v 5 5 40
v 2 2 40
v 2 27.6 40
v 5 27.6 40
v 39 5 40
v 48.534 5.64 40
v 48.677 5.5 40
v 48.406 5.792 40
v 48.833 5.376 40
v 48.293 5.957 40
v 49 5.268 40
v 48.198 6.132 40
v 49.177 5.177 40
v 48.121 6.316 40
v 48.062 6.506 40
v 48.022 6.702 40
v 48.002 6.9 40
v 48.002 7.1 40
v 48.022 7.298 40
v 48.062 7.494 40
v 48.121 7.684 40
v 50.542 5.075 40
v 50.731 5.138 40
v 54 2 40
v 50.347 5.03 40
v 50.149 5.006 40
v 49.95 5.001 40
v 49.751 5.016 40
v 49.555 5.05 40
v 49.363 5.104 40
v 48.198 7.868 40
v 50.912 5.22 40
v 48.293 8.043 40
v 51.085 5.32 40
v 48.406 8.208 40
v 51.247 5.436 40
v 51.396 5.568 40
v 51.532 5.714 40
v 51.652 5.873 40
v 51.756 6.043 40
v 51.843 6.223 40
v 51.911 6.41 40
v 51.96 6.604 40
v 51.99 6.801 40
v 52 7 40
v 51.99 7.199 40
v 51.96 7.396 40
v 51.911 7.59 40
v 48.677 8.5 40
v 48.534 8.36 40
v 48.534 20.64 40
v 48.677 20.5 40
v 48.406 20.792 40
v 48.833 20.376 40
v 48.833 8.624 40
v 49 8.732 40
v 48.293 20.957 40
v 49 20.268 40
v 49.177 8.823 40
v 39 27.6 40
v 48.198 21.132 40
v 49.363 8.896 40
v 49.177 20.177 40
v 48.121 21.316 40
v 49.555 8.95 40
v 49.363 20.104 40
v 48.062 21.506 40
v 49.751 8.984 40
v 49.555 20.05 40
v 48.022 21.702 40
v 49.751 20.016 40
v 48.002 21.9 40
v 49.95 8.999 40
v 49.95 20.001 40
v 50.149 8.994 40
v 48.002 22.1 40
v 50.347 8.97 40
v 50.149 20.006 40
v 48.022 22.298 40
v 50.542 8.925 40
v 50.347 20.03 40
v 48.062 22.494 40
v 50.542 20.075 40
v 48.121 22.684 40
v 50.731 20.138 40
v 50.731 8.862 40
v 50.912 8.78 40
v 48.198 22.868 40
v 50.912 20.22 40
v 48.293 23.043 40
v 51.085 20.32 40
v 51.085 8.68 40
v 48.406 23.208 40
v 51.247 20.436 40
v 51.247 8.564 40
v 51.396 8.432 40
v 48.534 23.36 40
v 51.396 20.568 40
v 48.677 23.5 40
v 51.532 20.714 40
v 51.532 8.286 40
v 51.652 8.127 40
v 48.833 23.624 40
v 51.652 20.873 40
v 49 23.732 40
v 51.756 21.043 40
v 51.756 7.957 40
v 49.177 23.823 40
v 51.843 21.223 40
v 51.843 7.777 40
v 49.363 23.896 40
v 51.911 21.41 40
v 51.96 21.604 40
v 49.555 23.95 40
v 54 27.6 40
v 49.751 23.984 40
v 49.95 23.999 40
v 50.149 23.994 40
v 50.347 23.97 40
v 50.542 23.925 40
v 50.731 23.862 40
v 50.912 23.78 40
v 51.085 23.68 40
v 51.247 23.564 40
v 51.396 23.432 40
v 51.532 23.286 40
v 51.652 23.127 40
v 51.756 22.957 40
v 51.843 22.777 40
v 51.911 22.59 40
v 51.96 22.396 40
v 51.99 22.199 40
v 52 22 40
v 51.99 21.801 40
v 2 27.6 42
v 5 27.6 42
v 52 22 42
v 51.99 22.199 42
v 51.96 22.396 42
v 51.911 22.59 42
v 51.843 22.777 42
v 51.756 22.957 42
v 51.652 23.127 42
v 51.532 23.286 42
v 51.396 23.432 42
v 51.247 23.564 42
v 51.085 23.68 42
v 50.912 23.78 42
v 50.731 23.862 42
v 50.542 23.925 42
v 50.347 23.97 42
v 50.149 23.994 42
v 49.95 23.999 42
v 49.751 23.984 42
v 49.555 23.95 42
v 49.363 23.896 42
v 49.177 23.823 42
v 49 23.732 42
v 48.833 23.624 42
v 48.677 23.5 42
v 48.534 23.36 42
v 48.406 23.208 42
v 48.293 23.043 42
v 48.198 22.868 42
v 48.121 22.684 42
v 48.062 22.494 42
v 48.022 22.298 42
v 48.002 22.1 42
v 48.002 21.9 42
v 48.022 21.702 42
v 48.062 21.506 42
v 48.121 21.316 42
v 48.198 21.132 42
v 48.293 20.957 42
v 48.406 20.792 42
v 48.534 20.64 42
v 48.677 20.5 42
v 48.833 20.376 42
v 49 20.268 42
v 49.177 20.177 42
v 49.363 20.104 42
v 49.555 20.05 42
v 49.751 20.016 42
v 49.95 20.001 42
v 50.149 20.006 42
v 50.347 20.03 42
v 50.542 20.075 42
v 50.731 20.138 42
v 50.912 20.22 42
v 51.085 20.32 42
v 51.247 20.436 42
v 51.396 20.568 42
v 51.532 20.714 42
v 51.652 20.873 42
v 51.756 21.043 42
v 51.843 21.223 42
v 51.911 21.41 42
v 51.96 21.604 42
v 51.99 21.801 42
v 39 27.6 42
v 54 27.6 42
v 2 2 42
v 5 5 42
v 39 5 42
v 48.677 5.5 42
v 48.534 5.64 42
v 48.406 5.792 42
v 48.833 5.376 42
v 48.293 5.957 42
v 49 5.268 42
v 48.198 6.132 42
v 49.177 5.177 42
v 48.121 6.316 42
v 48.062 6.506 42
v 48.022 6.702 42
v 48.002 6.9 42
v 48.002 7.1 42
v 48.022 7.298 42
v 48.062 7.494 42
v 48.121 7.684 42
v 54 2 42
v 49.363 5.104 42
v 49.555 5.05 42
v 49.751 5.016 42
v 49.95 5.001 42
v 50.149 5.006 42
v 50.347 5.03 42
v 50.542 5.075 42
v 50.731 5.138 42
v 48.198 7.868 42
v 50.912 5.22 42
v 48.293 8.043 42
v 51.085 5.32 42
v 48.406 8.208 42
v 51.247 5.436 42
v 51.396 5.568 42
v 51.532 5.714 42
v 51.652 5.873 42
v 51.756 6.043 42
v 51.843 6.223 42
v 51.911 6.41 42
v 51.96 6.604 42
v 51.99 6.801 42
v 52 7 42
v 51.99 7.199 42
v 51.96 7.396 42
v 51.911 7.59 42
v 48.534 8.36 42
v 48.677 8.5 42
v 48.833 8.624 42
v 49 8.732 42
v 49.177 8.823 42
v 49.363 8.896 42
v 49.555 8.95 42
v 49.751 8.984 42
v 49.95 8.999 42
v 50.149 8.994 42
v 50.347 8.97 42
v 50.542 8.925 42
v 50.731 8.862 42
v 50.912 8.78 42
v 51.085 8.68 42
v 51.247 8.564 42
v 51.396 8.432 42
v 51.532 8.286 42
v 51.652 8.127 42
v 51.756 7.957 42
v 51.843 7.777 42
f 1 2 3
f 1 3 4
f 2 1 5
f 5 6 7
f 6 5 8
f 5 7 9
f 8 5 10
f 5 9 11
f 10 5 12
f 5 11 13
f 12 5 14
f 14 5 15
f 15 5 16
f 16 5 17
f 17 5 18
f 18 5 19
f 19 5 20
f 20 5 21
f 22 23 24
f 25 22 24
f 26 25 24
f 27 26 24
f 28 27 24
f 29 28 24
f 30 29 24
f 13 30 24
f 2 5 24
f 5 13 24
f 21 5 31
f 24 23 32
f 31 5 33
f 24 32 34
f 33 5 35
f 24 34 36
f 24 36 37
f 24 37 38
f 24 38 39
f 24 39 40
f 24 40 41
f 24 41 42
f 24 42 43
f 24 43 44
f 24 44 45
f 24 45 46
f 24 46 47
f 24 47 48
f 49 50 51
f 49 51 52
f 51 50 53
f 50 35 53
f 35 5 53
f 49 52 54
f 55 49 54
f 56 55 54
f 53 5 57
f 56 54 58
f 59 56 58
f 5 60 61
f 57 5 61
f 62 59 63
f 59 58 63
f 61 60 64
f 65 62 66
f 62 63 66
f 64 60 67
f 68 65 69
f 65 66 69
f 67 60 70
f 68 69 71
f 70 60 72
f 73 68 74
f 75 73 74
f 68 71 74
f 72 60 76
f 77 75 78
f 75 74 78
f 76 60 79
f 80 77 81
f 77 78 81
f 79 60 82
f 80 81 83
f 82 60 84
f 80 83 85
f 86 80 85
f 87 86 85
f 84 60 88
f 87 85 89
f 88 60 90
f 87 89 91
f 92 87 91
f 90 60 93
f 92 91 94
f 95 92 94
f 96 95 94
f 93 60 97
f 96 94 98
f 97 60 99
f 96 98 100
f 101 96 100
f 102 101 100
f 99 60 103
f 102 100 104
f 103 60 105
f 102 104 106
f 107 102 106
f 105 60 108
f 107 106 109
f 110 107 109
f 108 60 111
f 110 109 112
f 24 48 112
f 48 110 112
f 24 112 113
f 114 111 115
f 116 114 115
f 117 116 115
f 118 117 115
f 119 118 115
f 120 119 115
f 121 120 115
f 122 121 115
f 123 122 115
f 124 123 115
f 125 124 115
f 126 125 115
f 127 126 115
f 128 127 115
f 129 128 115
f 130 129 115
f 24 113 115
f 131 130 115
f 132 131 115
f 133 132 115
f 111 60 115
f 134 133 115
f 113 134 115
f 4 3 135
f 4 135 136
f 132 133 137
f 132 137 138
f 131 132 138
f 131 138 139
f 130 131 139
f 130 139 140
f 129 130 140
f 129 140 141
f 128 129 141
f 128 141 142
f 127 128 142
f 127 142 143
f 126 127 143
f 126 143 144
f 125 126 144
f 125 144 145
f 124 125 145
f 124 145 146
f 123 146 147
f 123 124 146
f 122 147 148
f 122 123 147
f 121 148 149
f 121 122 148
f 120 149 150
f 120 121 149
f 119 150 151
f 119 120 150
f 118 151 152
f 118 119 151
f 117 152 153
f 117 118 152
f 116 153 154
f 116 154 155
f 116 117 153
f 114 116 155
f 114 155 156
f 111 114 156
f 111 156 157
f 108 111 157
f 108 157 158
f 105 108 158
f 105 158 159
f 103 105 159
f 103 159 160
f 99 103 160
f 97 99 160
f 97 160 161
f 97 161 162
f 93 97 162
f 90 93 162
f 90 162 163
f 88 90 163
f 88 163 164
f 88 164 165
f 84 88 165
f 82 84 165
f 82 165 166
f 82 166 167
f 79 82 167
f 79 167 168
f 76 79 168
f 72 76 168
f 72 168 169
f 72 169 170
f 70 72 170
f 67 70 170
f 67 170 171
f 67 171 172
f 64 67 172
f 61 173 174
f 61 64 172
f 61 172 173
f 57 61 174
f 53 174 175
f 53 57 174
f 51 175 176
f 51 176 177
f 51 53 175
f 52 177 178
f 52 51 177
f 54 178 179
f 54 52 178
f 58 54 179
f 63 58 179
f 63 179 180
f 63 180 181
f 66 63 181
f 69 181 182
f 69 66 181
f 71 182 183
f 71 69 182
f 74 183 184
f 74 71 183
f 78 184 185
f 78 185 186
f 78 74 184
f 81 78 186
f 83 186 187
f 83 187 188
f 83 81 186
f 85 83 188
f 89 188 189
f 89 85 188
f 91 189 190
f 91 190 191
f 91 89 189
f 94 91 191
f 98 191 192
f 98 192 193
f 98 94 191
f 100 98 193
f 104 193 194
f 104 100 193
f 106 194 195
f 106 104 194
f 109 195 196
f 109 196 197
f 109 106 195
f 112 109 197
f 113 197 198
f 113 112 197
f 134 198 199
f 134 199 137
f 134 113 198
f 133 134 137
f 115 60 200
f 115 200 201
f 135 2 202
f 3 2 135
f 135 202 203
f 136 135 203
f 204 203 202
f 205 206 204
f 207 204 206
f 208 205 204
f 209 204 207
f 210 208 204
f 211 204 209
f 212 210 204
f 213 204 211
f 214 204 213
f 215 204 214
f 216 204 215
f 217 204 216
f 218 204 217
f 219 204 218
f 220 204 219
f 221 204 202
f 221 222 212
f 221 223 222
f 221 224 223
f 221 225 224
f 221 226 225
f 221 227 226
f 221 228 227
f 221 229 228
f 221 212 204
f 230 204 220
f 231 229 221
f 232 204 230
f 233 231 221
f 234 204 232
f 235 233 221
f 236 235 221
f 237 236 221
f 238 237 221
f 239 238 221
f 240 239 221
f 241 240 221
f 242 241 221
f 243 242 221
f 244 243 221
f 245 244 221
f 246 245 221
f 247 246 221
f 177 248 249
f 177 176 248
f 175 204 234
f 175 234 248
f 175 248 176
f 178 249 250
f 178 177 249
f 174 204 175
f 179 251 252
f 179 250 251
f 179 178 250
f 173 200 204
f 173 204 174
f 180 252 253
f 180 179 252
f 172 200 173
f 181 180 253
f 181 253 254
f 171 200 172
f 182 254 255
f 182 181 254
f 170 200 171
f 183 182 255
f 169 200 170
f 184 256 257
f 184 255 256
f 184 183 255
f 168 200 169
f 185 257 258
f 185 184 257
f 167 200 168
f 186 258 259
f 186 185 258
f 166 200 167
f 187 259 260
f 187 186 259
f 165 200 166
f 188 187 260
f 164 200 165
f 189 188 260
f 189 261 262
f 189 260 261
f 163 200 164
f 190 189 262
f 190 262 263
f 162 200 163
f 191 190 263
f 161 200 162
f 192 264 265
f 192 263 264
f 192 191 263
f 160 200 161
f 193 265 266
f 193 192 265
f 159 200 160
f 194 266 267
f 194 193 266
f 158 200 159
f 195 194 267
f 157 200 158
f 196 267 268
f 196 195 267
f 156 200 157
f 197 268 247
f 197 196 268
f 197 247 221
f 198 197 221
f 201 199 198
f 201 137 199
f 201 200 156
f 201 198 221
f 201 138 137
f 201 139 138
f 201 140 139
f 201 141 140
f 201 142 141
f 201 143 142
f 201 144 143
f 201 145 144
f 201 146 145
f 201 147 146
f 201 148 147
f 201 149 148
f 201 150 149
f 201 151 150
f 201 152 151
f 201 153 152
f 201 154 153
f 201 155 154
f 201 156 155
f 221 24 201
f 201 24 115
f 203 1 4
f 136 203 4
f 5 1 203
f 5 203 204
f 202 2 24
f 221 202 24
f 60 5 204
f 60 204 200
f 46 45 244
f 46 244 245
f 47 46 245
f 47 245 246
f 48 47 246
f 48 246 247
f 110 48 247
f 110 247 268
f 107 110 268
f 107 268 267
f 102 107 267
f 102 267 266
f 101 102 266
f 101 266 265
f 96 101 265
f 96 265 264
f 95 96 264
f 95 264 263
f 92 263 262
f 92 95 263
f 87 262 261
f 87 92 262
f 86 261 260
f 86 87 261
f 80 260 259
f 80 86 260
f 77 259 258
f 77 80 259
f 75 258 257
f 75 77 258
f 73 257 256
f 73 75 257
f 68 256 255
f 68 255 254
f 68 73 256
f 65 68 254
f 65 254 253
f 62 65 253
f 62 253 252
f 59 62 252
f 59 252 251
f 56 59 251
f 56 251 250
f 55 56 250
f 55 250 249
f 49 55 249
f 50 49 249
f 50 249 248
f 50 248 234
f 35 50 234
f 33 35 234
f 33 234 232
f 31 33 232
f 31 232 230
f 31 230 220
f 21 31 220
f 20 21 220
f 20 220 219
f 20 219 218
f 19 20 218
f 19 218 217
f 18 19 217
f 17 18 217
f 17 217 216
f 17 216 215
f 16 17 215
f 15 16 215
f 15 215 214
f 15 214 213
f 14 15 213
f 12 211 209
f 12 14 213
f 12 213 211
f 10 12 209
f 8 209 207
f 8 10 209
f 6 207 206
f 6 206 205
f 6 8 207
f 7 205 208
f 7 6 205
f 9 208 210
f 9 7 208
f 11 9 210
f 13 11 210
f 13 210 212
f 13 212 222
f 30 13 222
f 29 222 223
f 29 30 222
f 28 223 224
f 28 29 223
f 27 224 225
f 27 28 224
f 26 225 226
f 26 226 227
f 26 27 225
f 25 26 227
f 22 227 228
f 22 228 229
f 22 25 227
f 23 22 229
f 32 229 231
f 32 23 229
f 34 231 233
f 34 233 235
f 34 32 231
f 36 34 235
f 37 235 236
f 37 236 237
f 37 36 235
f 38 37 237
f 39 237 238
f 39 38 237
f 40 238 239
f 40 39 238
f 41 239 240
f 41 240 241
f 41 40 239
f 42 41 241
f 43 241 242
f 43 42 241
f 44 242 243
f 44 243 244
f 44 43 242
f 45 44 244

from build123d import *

# Parameters (mm, degrees)
CYLINDER008_R     = 2
CYLINDER008_DEPTH = 4
CYLINDER015_R     = 2
CYLINDER015_DEPTH = 4
BOX006_W          = 34
BOX006_H          = 23
BOX006_DEPTH      = 2
BOX003_W          = 52
BOX003_H          = 25.6
BOX003_DEPTH      = 2


with BuildPart() as button_hole:
    # Cylinder008 → Cylinder008 (new body)
    with BuildSketch(Plane(origin=(50, 7, 38), x_dir=(1, 0, 0), z_dir=(0, 0, 1))):
        Circle(CYLINDER008_R)
    extrude(amount=CYLINDER008_DEPTH)


with BuildPart() as button_hole001:
    # Cylinder015 → Cylinder015 (new body)
    with BuildSketch(Plane(origin=(50, 22, 38), x_dir=(1, 0, 0), z_dir=(0, 0, 1))):
        Circle(CYLINDER015_R)
    extrude(amount=CYLINDER015_DEPTH)


with BuildPart() as fusion004:
    # Box006 → Box006 (new body)
    with BuildSketch(Plane(origin=(5, 5, 40), x_dir=(1, 0, 0), z_dir=(0, 0, 1))):
        with Locations((17, 11.5)):
            Rectangle(BOX006_W, BOX006_H)
    extrude(amount=BOX006_DEPTH)

    # Fusion004: union button_hole, button_hole001
    add(button_hole.part)
    add(button_hole001.part)


with BuildPart() as cover:
    # Box003 → Box003 (new body)
    with BuildSketch(Plane(origin=(2, 2, 40), x_dir=(1, 0, 0), z_dir=(0, 0, 1))):
        with Locations((26, 12.8)):
            Rectangle(BOX003_W, BOX003_H)
    extrude(amount=BOX003_DEPTH)

    # Cut: cut Fusion004
    add(fusion004.part, mode=Mode.SUBTRACT)


solid = cover.part
